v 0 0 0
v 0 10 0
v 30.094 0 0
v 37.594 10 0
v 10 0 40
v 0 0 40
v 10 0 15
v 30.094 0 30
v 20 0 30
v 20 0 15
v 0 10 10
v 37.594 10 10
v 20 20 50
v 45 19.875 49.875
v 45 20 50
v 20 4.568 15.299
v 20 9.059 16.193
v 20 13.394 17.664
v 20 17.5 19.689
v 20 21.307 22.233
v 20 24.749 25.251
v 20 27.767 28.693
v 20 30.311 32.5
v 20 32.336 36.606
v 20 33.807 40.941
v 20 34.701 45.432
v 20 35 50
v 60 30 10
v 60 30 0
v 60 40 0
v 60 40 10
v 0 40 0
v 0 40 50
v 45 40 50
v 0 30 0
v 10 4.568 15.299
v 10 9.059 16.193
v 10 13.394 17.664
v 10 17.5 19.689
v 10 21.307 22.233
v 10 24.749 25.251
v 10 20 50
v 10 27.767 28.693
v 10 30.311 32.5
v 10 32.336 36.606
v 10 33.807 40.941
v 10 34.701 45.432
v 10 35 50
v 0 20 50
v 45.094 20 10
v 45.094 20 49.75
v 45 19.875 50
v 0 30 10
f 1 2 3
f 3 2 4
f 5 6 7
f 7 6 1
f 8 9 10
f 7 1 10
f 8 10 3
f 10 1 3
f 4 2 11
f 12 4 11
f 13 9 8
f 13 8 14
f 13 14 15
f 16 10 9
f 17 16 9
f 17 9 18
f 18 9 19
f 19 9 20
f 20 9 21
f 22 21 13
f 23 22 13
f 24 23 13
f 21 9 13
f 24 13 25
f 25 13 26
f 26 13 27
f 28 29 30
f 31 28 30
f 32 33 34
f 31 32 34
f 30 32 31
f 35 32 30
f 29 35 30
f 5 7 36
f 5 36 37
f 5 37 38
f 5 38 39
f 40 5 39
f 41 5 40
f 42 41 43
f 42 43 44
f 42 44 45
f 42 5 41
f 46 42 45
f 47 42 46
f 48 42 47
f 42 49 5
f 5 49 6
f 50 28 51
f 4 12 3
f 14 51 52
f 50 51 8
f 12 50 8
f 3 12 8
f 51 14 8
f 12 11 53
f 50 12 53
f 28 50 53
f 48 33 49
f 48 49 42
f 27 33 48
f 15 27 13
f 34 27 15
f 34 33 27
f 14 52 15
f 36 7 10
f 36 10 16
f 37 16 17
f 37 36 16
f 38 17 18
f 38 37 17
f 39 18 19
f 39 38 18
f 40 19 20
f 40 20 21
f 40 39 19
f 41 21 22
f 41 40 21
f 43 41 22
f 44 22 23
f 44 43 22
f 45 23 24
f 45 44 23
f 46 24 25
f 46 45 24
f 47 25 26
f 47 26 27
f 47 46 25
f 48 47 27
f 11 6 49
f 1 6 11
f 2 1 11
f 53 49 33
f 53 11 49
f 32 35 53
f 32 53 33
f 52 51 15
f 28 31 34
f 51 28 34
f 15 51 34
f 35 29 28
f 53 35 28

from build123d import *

# Parameters (mm, degrees)
F0_W      = 60
F0_H      = 40
F1_DEPTH  = 50
F2_W      = 20
F2_H      = 10
F3_DEPTH  = 60
F7_DEPTH  = 10
F10_DEPTH = 25
F11_R     = 35
F12_DEPTH = 10
F15_DEPTH = 50
F17_DEPTH = 50.001
F19_DEPTH = 20.1260024637


with BuildPart() as f1:
    # F0 (on Top) → F1 (new body)
    with BuildSketch(Plane.XY):
        with Locations((30, 20)):
            Rectangle(F0_W, F0_H)
    extrude(amount=F1_DEPTH)

    # F2 (on face) → F3 (cut, through all)
    with BuildSketch(Plane.YZ.offset(60)):
        with Locations((20, 5)):
            Rectangle(F2_W, F2_H)
    extrude(amount=-F3_DEPTH, mode=Mode.SUBTRACT)

    # F6 (on face) → F7 (cut, through all)
    with BuildSketch(Plane(origin=(0, 0, 0), x_dir=(0, -1, 0), z_dir=(-1, 0, 0))):
        Polygon((0, 40), (0, 50), (-20, 50), align=None)
    extrude(amount=-F7_DEPTH, mode=Mode.SUBTRACT)

    # F9 (on offset) → F10 (cut, through all)
    with BuildSketch(Plane.YZ.offset(20)):
        Polygon((20, 50), (0, 50), (0, 30), align=None)
    extrude(amount=F10_DEPTH, mode=Mode.SUBTRACT)

    # F11 (on offset) → F12 (cut, through all)
    with BuildSketch(Plane.YZ.offset(10)):
        with Locations((0, 50)):
            Circle(F11_R)
    extrude(amount=F12_DEPTH, mode=Mode.SUBTRACT)

    # F14 (on offset) → F15 (cut)
    with BuildSketch(Plane.XY.offset(50)):
        Polygon((30.0937518477, 0), (45.0937518477, 0), (45.0937518477, 20), align=None)
    extrude(amount=-F15_DEPTH, mode=Mode.SUBTRACT)

    # F16 (on face) → F17 (cut, through all)
    with BuildSketch(Plane.XY.offset(50)):
        Polygon((60, 0), (60, 30), (45.0937518477, 20), (45.0937518477, 0), align=None)
    extrude(amount=-F17_DEPTH, mode=Mode.SUBTRACT)

    # F18 (on face) → F19 (cut, through all)
    with BuildSketch(Plane(origin=(0, 40, 0), x_dir=(-1, 0, 0), z_dir=(0, 1, 0))):
        Polygon((-45, 50), (-60, 50), (-60, 10), align=None)
    extrude(amount=-F19_DEPTH, mode=Mode.SUBTRACT)


solid = f1.part
